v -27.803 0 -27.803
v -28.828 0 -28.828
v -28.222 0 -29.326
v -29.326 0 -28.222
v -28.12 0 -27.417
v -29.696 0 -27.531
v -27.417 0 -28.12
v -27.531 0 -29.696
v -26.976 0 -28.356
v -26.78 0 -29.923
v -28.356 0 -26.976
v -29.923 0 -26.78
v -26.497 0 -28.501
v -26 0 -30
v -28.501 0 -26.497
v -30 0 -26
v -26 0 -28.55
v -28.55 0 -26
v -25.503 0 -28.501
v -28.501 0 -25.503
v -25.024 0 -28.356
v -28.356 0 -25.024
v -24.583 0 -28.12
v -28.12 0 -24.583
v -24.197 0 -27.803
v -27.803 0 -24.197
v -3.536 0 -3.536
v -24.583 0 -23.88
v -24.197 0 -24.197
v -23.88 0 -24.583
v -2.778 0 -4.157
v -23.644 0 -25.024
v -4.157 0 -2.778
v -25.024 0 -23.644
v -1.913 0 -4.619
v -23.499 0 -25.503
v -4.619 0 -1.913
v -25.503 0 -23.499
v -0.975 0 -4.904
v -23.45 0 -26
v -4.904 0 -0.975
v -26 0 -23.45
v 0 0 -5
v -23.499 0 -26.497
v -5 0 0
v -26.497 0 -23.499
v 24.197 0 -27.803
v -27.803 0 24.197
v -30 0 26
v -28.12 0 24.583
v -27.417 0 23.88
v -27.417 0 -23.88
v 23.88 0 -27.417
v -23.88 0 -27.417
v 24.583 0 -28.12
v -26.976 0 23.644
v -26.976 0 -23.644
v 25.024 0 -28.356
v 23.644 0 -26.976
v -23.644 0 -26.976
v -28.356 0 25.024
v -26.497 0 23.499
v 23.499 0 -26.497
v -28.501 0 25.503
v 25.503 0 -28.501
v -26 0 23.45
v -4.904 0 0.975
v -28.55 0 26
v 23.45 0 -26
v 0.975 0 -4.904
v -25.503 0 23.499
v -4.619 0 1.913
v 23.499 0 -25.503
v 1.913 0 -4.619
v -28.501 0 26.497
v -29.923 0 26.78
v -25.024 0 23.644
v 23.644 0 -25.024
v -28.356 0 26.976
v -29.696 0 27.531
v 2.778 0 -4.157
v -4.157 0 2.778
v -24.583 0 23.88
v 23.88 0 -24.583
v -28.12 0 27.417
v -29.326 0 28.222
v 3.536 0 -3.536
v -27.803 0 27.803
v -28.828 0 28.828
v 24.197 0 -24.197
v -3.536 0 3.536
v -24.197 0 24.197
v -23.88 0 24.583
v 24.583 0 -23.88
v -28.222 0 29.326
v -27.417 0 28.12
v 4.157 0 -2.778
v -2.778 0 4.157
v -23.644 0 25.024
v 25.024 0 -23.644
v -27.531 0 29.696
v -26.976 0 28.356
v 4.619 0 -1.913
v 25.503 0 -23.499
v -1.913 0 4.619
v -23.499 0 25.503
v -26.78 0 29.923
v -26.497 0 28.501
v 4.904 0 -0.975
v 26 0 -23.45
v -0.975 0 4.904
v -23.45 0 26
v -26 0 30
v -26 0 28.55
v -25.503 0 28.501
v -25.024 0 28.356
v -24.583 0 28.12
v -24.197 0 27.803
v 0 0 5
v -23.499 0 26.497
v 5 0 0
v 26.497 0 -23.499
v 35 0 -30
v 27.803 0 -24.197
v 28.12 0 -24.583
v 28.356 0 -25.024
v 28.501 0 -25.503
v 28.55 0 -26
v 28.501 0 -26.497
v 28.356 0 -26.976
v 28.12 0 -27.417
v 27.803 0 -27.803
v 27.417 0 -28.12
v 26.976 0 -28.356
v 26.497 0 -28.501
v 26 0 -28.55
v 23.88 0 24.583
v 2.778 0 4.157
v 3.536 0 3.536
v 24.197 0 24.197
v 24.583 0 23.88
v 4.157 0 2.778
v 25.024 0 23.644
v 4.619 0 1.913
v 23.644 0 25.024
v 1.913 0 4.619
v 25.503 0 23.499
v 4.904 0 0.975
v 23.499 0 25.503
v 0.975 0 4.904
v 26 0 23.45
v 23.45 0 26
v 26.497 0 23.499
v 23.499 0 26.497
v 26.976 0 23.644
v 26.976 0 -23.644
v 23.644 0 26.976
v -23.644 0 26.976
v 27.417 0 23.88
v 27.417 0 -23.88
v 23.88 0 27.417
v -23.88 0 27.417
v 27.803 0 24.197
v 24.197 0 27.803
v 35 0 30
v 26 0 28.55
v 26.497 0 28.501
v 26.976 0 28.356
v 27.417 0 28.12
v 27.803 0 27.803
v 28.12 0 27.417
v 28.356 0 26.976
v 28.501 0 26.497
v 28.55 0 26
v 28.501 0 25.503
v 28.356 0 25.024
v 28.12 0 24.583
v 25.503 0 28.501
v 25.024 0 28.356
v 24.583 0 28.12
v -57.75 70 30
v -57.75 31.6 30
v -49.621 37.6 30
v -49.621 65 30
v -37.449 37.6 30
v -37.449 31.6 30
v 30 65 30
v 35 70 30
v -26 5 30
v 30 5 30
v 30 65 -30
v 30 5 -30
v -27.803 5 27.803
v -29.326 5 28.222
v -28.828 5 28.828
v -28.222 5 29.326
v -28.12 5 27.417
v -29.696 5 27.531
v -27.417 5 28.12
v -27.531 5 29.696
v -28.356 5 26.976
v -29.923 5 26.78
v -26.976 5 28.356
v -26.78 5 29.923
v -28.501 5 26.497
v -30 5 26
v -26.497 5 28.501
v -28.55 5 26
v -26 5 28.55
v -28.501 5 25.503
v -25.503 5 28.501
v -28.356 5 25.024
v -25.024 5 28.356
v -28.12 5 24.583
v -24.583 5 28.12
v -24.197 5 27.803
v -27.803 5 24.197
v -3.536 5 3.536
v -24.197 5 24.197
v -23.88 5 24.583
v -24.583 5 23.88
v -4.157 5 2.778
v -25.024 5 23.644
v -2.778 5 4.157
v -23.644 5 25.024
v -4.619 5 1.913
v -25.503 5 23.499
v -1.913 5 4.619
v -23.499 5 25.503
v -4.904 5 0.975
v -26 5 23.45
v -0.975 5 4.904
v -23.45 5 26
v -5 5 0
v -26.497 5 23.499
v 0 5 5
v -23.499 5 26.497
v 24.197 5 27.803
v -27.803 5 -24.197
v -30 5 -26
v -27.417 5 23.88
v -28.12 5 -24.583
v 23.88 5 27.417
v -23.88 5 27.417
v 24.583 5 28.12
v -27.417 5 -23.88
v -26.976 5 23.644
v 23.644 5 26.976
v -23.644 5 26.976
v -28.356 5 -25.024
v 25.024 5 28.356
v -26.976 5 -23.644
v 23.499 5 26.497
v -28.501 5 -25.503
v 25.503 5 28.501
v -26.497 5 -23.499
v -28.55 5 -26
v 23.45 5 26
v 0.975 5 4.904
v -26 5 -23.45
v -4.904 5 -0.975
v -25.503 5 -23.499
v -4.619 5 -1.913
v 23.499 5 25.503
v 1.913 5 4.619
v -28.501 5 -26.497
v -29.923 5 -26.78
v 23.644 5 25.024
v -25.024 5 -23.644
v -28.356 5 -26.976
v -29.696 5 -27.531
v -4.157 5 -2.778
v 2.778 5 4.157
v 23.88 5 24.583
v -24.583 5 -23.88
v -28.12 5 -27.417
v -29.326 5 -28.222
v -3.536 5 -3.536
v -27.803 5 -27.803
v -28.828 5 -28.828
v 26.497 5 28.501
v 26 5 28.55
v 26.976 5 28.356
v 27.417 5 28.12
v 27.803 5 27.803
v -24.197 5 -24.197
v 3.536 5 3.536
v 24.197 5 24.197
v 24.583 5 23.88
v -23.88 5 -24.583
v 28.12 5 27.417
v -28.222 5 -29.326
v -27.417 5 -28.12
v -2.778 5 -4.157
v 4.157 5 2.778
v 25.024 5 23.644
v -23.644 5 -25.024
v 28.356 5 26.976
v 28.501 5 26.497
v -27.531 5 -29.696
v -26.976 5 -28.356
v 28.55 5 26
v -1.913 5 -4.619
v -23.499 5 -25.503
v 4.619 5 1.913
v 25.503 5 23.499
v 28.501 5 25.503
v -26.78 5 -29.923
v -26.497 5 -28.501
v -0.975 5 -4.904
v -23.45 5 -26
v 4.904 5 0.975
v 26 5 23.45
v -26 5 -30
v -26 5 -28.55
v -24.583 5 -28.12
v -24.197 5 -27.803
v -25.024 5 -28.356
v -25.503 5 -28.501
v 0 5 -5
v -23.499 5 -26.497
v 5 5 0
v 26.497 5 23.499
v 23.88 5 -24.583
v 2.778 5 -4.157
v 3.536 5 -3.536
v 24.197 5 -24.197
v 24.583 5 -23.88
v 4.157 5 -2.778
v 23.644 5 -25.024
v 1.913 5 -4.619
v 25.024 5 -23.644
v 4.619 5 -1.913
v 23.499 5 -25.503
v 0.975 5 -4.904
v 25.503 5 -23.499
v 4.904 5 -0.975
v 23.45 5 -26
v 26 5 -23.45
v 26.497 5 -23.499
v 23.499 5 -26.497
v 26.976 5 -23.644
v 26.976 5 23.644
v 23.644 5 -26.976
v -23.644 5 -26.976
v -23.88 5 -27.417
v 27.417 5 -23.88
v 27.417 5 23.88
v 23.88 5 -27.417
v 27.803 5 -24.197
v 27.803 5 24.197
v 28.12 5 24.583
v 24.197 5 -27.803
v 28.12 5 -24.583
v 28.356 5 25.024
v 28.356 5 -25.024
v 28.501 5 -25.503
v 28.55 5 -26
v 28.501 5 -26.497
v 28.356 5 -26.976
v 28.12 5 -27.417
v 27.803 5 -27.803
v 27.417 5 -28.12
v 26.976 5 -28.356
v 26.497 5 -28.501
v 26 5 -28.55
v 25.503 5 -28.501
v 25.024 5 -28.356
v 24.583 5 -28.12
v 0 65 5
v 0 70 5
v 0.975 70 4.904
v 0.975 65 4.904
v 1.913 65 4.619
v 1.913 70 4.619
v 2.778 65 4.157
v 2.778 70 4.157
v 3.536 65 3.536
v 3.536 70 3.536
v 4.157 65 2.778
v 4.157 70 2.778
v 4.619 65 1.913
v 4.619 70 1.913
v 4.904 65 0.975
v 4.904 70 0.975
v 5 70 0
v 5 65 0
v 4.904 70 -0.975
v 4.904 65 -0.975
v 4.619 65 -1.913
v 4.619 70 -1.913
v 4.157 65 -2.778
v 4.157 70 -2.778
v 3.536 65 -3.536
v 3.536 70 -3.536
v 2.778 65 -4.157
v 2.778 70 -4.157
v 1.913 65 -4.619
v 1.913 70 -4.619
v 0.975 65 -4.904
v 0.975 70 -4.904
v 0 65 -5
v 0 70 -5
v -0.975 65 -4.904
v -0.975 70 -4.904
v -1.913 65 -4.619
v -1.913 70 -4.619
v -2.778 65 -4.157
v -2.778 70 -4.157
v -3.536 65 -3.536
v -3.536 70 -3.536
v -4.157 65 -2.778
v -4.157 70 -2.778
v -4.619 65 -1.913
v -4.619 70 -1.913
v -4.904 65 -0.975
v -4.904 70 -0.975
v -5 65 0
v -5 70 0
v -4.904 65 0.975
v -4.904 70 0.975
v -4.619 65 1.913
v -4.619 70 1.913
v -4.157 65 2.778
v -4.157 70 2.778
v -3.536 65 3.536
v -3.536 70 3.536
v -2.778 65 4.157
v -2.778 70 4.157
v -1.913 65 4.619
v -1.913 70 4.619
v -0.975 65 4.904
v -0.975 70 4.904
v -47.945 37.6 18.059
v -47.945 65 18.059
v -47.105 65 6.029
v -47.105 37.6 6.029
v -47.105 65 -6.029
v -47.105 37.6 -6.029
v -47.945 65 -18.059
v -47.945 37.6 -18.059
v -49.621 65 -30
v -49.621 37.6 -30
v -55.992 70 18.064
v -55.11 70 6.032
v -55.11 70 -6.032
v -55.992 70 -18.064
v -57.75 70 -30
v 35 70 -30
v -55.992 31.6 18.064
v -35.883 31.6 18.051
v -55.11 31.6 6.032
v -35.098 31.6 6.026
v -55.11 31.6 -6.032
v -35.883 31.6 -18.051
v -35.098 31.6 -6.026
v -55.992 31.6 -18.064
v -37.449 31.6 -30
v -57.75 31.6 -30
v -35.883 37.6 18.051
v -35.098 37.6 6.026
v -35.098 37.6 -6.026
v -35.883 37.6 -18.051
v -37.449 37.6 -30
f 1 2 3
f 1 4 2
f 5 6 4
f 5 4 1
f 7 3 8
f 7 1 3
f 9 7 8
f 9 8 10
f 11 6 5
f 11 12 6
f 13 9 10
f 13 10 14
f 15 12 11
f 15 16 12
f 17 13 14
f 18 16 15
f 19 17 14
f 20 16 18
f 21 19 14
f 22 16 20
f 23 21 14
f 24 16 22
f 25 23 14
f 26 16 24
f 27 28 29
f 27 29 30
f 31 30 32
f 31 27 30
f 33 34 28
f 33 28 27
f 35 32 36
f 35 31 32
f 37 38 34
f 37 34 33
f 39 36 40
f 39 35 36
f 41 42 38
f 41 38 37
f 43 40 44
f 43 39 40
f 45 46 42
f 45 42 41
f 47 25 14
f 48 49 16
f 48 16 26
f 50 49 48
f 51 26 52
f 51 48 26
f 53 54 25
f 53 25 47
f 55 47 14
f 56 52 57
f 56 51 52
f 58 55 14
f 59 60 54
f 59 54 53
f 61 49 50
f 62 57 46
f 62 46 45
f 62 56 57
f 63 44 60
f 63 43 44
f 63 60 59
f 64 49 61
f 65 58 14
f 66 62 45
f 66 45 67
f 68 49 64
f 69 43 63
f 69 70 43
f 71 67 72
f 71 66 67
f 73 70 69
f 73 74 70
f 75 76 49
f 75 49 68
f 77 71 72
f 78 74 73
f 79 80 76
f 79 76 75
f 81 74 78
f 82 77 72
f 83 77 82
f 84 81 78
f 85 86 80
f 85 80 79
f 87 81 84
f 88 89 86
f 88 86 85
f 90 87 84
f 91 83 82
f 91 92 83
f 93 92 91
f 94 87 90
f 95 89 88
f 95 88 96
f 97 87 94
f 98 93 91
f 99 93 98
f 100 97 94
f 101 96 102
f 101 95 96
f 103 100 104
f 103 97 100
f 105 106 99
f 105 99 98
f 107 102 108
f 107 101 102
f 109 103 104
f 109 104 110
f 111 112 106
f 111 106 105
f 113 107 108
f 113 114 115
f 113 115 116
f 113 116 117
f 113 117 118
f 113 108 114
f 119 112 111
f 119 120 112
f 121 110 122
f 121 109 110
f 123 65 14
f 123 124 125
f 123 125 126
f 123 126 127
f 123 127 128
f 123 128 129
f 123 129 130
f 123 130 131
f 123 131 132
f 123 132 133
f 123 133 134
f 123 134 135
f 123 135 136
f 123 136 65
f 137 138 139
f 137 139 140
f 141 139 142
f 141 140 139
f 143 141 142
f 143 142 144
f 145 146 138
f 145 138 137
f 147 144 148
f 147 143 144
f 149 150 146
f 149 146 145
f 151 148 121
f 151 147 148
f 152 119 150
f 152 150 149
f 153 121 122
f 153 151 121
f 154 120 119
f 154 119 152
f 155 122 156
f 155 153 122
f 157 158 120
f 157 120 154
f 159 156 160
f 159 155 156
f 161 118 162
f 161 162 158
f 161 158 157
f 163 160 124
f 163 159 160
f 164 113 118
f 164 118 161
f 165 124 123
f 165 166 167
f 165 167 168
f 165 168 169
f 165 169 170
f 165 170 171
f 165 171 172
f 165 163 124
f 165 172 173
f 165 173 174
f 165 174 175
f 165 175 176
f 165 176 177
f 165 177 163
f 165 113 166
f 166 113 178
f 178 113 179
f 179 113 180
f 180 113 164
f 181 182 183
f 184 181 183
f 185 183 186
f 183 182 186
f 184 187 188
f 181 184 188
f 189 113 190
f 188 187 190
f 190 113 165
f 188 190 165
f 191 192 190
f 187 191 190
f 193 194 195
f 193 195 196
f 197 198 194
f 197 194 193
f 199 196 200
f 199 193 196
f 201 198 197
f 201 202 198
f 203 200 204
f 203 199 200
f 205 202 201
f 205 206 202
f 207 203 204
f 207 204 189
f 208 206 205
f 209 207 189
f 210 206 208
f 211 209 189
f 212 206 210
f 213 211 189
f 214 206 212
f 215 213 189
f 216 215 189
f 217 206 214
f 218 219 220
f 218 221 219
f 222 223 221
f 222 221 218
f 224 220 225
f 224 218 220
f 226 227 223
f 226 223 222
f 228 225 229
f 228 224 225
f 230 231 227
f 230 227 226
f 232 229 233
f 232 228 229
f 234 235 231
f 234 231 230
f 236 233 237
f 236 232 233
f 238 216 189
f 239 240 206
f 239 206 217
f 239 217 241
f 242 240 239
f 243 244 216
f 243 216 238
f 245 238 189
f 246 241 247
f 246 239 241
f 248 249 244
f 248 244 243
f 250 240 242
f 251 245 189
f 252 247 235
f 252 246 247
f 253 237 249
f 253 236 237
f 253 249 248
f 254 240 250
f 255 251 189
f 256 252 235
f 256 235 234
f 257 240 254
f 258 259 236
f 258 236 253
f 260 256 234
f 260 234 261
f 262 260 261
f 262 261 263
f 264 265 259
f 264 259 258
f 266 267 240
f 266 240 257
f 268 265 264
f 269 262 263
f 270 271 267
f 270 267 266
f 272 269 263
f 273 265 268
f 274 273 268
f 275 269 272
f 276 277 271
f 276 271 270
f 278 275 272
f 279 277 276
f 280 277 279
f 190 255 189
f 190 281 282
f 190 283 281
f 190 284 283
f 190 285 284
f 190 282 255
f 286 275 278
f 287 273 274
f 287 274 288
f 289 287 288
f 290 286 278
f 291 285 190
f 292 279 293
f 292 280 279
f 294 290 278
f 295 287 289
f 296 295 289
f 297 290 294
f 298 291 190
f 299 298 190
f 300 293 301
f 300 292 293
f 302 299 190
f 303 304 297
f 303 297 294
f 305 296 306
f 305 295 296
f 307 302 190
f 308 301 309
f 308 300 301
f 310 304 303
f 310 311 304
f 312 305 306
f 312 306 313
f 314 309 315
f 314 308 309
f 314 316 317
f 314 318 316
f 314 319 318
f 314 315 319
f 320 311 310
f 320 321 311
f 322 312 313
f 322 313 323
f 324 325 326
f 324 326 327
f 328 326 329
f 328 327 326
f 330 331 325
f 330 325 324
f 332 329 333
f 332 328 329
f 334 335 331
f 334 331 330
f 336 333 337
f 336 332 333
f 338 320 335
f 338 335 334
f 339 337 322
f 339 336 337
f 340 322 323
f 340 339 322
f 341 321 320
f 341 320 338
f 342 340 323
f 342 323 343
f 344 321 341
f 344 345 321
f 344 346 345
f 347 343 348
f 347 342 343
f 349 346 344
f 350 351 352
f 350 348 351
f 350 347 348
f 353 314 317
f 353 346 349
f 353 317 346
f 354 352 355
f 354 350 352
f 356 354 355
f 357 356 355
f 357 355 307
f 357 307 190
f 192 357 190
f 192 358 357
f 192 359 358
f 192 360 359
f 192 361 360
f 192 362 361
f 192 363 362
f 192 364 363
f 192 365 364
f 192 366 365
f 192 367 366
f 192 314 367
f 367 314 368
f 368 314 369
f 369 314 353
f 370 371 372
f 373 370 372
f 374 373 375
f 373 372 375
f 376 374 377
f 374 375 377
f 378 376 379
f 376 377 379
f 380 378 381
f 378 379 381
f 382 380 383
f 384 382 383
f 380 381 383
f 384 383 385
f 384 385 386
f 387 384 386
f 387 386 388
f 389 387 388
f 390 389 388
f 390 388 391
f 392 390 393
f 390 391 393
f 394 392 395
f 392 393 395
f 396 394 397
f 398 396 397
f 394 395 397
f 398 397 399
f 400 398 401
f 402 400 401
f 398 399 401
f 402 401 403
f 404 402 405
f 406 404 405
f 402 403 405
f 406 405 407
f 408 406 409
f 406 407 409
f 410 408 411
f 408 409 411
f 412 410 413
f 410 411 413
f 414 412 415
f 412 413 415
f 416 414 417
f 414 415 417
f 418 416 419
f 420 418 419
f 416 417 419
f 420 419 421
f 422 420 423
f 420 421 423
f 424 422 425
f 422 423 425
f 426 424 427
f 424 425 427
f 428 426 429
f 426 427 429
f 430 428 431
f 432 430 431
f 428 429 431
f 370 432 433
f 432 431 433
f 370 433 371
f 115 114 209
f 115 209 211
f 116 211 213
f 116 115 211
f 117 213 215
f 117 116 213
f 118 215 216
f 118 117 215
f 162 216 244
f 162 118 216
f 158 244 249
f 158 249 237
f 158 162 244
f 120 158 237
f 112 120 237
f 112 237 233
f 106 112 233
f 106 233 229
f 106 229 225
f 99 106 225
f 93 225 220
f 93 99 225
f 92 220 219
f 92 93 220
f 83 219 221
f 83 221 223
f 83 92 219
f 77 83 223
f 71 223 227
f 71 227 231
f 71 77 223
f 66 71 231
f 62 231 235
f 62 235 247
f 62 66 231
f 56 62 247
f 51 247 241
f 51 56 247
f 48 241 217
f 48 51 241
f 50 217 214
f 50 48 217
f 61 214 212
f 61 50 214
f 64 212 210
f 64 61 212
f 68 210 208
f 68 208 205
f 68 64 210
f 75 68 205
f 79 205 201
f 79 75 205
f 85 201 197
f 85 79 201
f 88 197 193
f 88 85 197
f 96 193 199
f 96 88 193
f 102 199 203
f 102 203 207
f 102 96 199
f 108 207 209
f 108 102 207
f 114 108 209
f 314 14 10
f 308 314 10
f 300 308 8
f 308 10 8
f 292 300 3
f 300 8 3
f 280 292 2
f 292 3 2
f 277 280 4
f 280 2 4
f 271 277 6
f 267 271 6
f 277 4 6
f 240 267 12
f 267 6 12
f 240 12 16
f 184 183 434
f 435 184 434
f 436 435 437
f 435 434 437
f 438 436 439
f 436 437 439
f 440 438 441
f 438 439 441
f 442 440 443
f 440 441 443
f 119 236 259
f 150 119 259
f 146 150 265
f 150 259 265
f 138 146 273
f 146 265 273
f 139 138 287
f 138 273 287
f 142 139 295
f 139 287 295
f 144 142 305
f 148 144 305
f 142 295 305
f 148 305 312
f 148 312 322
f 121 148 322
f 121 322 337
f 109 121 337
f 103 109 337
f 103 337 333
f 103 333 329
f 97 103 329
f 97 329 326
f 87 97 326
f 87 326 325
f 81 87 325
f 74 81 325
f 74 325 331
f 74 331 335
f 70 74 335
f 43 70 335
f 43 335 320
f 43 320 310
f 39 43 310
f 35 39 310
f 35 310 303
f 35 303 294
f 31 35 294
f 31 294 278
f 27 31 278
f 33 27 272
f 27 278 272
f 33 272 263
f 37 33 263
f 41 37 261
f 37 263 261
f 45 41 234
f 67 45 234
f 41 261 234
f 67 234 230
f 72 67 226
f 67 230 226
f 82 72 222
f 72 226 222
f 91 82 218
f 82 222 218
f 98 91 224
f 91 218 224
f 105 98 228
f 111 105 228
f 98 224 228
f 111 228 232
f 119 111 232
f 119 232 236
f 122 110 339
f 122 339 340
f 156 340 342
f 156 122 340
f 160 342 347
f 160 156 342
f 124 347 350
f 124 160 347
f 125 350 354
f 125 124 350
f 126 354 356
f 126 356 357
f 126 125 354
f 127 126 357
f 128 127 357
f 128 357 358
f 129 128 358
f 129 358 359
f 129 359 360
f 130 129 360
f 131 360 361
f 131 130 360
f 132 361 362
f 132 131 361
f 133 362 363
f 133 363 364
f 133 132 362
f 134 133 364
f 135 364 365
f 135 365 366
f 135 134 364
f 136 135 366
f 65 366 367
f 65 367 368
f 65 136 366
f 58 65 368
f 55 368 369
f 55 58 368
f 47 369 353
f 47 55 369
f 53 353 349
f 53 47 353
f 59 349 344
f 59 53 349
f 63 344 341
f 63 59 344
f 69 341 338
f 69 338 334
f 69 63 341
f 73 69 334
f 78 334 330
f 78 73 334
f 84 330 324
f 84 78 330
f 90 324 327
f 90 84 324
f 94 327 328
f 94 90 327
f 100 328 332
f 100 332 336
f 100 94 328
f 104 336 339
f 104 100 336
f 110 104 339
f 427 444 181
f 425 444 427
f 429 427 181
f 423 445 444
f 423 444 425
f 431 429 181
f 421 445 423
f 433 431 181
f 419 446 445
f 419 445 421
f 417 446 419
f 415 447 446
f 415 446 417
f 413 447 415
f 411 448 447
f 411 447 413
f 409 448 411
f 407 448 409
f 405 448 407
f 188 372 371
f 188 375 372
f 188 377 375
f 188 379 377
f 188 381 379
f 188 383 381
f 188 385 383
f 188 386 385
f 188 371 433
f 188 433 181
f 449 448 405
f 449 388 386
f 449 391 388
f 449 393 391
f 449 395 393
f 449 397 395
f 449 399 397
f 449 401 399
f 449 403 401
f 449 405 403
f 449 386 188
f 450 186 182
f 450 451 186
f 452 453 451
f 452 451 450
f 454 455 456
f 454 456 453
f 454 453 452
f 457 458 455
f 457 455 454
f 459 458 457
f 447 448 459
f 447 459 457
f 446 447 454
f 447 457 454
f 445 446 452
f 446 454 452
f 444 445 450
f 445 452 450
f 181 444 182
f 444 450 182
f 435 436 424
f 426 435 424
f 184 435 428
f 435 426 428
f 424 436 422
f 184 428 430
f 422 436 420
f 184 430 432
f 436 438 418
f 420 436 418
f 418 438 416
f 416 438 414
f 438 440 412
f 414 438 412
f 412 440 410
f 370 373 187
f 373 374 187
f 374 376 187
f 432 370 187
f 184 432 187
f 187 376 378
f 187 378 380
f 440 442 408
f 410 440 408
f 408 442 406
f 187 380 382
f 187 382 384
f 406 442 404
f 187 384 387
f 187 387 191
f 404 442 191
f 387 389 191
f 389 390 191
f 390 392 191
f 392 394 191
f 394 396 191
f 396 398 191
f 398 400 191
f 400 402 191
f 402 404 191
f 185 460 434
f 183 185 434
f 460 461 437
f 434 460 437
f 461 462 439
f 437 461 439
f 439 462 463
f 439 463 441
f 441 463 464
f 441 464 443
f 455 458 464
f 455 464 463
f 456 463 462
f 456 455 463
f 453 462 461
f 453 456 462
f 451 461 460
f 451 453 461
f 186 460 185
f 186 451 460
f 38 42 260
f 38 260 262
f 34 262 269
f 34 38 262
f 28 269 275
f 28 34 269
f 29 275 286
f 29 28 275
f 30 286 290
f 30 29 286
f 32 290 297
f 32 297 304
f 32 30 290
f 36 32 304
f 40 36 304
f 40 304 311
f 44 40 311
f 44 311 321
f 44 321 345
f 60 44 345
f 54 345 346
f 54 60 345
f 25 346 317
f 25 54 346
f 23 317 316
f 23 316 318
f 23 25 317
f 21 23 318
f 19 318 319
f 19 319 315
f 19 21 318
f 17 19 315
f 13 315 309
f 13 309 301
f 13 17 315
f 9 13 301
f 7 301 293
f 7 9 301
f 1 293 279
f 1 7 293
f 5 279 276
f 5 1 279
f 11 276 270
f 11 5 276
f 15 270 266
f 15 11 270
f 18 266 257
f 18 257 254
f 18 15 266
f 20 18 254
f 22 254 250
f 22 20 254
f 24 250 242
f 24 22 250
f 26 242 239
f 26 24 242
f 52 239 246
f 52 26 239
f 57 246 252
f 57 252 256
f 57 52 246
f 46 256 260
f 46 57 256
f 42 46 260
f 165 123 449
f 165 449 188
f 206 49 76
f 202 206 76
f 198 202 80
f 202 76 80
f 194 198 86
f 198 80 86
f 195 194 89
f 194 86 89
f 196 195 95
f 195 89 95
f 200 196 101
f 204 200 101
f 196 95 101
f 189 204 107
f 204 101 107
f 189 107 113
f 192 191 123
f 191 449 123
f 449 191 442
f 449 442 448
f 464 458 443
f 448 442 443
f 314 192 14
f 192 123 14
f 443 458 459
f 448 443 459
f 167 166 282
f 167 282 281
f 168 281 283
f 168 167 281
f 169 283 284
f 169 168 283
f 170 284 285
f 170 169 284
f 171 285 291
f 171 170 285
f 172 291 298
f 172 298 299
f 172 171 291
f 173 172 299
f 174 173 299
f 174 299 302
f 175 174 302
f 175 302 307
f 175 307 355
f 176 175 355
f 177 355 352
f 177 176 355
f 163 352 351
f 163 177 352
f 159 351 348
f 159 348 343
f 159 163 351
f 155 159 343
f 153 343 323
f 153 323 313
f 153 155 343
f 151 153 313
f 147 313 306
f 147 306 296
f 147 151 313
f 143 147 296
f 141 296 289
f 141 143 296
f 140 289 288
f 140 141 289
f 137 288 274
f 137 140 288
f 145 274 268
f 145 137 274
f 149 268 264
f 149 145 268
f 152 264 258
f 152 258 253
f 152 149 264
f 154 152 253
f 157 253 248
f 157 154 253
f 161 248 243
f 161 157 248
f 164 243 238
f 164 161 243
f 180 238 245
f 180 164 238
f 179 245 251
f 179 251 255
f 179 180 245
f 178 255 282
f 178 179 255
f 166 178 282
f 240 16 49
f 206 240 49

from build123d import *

# Parameters (mm, degrees)
SKETCH1_R           = 2.55
BOSS_EXTRUDE1_DEPTH = 5
SKETCH2_R           = 5
CUT_EXTRUDE1_DEPTH  = 10
SKETCH3_W           = 5
SKETCH3_H           = 60
BOSS_EXTRUDE2_DEPTH = 70
SKETCH4_W           = 80
SKETCH4_H           = 60
BOSS_EXTRUDE4_DEPTH = 5
SKETCH5_R           = 5
CUT_EXTRUDE3_DEPTH  = 5
BOSS_EXTRUDE6_DEPTH = 6
BOSS_EXTRUDE7_START = -32.4
BOSS_EXTRUDE7_DEPTH = 32.4


# Read off the part's stored shape, not the designer's step: Boss-Extrude7
with BuildPart() as part:
    # Sketch1 → Boss-Extrude1 (new body)
    with BuildSketch(Plane(origin=(0, 0, 0), x_dir=(1, 0, 0), z_dir=(0, 1, 0))):
        with BuildLine():
            Line((-26, -30), (30, -30))
            Line((30, -30), (30, 30))
            Line((30, 30), (-26, 30))
            ThreePointArc((-26, 30), (-28.828427125, 28.828427125), (-30, 26))
            Line((-30, 26), (-30, -26))
            ThreePointArc((-30, -26), (-28.828427125, -28.828427125), (-26, -30))
        make_face()
        with Locations(Location((26, 26, 0), (0, 0, 270))):
            Circle(SKETCH1_R, mode=Mode.SUBTRACT)
        with Locations(Location((-26, 26, 0), (0, 0, 270))):
            Circle(SKETCH1_R, mode=Mode.SUBTRACT)
        with Locations(Location((-26, -26, 0), (0, 0, 270))):
            Circle(SKETCH1_R, mode=Mode.SUBTRACT)
        with Locations(Location((26, -26, 0), (0, 0, 270))):
            Circle(SKETCH1_R, mode=Mode.SUBTRACT)
    extrude(amount=BOSS_EXTRUDE1_DEPTH)

    # Sketch2 → Cut-Extrude1 (cut)
    with BuildSketch(Plane(origin=(0, 5, 0), x_dir=(1, 0, 0), z_dir=(0, 1, 0))):
        with Locations(Location((0, 0, 0), (0, 0, 270))):
            Circle(SKETCH2_R)
    extrude(amount=-CUT_EXTRUDE1_DEPTH, mode=Mode.SUBTRACT)

    # Sketch3 → Boss-Extrude2 (add)
    with BuildSketch(Plane.XZ):
        with Locations((32.5, 0)):
            Rectangle(SKETCH3_W, SKETCH3_H)
    extrude(amount=-BOSS_EXTRUDE2_DEPTH)

    # Sketch4 → Boss-Extrude4 (add)
    with BuildSketch(Plane(origin=(0, 70, 0), x_dir=(1, 0, 0), z_dir=(0, 1, 0))):
        with Locations((-10, 0)):
            Rectangle(SKETCH4_W, SKETCH4_H)
    extrude(amount=-BOSS_EXTRUDE4_DEPTH)

    # Sketch5 → Cut-Extrude3 (cut)
    with BuildSketch(Plane(origin=(0, 70, 0), x_dir=(1, 0, 0), z_dir=(0, 1, 0))):
        with Locations(Location((0, 0, 0), (0, 0, 270))):
            Circle(SKETCH5_R)
    extrude(amount=-CUT_EXTRUDE3_DEPTH, mode=Mode.SUBTRACT)



with BuildPart() as body_2:
    # Sketch10 → Boss-Extrude6 (new body)
    with BuildSketch(Plane(origin=(0, 31.6, 0), x_dir=(1, 0, 0), z_dir=(0, 1, 0))):
        with BuildLine():
            Line((-37.448637365, -30), (-57.750192604, -30))
            ThreePointArc((-57.750192604, -30), (-55, 0), (-57.750192604, 30))
            Line((-57.750192604, 30), (-37.448637365, 30))
            ThreePointArc((-37.448637365, 30), (-35, 0), (-37.448637365, -30))
        make_face()
    extrude(amount=BOSS_EXTRUDE6_DEPTH)


with BuildPart() as part_1:
    add(part.part)

    add(body_2.part)  # Boss-Extrude7 merges body 2
    # Boss-Extrude7 outline → Boss-Extrude7 (add)
    with BuildSketch(Plane(origin=(0, 70, 0), x_dir=(1, 0, 0), z_dir=(0, 1, 0)).offset(BOSS_EXTRUDE7_START)):
        with BuildLine():
            ThreePointArc((-57.750192604, 30), (-55, 0), (-57.750192604, -30))
            Line((-57.750192604, -30), (-49.621010685, -30))
            ThreePointArc((-49.621010685, -30), (-47, 0), (-49.621010685, 30))
            Line((-49.621010685, 30), (-57.750192604, 30))
        make_face()
    extrude(amount=BOSS_EXTRUDE7_DEPTH)


solid = part_1.part
